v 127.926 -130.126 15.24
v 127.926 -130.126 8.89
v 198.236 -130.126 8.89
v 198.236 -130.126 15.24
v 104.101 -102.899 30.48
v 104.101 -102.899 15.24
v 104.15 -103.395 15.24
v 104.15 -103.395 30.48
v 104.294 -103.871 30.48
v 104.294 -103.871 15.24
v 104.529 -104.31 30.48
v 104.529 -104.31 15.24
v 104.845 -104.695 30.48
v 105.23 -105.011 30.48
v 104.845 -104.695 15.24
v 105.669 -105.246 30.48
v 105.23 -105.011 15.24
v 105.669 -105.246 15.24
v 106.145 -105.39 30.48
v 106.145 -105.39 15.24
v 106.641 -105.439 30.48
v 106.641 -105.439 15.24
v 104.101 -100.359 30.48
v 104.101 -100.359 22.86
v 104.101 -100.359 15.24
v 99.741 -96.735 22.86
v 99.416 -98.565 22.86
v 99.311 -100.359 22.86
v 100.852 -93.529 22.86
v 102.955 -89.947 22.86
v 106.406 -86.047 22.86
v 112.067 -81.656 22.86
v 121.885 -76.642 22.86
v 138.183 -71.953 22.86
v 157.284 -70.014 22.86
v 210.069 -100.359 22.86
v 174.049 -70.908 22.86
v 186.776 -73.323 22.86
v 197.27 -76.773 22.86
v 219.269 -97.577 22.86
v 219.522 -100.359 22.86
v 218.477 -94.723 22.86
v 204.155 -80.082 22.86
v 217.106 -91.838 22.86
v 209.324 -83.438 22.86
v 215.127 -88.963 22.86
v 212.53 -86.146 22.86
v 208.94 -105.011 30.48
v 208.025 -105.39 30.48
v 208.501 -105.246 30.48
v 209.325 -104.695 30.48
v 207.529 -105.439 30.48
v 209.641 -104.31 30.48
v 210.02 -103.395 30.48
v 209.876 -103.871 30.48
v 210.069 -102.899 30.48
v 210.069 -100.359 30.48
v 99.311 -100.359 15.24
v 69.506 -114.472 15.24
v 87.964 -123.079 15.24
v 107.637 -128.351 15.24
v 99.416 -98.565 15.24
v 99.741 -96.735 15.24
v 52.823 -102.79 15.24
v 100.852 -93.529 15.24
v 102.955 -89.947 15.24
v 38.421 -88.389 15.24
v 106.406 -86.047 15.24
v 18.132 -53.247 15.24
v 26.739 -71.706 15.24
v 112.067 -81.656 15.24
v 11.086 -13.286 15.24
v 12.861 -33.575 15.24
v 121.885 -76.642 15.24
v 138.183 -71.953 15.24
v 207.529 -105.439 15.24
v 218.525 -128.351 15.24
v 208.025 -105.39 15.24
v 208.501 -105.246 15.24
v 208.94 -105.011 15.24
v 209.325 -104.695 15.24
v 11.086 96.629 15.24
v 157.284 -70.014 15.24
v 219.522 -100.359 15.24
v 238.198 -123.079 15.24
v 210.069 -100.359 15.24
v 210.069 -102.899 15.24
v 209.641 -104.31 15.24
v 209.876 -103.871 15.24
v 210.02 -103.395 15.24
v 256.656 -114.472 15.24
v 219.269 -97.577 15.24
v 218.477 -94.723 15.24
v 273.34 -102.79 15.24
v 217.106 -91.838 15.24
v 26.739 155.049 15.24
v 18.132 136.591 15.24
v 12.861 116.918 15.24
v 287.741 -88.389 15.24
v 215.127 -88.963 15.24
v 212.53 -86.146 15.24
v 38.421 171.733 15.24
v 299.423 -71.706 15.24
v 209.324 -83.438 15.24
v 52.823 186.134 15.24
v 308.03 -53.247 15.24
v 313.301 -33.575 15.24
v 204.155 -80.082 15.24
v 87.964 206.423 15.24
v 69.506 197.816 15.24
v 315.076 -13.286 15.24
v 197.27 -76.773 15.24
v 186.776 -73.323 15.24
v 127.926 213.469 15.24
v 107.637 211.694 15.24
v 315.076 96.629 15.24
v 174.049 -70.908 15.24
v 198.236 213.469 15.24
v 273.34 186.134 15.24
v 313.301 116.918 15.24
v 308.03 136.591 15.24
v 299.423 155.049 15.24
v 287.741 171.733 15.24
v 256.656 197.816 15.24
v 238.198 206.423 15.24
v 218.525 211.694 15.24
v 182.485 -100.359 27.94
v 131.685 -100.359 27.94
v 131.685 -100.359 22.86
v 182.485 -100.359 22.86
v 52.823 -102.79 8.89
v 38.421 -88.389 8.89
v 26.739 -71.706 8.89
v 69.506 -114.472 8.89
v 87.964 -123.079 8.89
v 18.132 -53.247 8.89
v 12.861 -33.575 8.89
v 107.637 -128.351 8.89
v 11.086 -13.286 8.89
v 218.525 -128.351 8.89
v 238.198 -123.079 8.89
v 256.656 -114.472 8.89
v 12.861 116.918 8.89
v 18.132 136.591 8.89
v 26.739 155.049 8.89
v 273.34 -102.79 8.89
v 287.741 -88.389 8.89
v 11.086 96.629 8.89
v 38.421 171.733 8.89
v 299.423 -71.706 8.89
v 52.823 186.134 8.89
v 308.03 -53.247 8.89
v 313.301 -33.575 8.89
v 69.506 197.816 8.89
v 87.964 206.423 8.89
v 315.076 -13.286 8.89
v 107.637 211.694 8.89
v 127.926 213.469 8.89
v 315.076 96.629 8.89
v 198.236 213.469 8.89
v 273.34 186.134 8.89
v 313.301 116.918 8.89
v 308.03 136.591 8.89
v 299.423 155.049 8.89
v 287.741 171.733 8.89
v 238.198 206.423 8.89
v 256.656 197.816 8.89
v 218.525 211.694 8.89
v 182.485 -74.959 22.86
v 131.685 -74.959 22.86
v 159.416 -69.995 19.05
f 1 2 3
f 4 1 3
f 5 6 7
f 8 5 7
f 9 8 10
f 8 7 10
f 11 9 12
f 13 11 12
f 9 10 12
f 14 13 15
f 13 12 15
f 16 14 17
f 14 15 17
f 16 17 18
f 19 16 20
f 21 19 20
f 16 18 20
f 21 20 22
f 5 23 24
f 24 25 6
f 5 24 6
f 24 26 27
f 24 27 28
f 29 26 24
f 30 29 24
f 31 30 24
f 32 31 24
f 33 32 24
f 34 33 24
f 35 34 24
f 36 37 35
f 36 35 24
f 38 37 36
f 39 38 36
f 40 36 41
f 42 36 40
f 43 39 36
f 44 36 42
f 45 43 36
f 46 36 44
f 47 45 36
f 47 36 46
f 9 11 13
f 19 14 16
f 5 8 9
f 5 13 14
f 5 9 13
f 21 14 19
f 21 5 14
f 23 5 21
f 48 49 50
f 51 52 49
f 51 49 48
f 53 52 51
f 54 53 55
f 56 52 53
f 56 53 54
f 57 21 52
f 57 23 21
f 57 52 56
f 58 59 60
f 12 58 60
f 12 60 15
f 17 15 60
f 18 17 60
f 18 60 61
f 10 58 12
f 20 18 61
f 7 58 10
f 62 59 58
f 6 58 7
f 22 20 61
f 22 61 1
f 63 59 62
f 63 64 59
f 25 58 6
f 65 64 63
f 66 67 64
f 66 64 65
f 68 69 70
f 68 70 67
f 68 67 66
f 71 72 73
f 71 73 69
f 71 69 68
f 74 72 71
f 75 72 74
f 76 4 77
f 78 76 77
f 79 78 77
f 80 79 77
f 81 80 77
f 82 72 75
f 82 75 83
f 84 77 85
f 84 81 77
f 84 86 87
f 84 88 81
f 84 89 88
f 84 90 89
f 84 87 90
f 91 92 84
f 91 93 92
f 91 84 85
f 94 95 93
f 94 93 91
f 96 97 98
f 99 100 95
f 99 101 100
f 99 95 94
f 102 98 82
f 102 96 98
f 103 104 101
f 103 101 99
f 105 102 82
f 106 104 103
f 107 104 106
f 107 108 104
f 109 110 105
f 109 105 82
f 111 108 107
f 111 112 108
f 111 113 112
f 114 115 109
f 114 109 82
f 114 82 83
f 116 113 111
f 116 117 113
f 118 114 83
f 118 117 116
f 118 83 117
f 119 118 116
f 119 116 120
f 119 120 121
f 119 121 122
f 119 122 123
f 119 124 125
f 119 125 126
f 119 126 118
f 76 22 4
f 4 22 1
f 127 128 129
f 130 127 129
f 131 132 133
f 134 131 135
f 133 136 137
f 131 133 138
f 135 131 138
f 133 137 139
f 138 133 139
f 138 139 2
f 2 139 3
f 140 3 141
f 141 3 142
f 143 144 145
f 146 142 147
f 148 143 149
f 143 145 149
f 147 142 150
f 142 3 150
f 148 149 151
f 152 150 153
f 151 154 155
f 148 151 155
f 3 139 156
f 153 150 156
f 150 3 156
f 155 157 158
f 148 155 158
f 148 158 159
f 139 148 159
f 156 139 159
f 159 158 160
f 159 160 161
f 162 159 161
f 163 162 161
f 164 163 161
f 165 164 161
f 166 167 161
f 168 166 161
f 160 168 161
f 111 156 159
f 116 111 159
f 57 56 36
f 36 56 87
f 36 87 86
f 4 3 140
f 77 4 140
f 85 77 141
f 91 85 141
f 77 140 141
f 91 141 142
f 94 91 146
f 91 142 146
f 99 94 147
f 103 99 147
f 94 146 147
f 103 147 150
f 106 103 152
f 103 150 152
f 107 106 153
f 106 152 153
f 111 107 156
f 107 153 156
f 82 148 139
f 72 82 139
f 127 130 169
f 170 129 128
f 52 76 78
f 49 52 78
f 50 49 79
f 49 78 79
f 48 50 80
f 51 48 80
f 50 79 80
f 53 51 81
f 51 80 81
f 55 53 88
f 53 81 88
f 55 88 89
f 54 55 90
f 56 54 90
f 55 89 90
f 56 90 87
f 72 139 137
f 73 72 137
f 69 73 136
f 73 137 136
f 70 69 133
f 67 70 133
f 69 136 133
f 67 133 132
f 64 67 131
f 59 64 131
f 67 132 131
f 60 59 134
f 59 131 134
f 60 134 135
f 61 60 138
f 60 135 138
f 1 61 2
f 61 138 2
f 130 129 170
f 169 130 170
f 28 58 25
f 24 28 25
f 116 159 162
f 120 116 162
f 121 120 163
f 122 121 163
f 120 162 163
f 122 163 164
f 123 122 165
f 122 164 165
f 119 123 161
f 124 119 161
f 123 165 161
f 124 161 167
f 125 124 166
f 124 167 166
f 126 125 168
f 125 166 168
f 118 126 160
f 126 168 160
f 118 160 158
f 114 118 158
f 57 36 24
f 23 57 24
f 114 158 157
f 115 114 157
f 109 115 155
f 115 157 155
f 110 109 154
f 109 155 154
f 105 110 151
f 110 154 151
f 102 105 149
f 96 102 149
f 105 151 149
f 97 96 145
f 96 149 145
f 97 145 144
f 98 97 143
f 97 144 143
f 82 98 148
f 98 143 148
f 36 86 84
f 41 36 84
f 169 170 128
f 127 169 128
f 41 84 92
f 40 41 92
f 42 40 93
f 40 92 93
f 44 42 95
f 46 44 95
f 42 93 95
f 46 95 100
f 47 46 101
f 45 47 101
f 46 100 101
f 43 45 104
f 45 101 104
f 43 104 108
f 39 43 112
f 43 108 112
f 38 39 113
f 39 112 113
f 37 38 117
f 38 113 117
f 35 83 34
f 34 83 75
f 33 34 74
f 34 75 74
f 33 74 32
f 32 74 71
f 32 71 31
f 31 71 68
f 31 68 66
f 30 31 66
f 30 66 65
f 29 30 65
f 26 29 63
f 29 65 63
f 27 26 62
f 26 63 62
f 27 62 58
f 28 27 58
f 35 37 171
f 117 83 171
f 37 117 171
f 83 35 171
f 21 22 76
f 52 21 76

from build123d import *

# Parameters (mm, degrees)
BOSS_EXTRUDE3_DEPTH = 6.35
BOSS_EXTRUDE4_DEPTH = 7.62
BOSS_EXTRUDE5_DEPTH = 15.24
GUSSET1_THICKNESS   = 50.8


with BuildPart() as part:
    # Sketch14 → Boss-Extrude3 (new body)
    with BuildSketch(Plane.XY.offset(8.89)):
        with BuildLine():
            Line((198.236322144, 213.469330483), (127.925881088, 213.469330483))
            ThreePointArc((127.925881088, 213.469330483), (45.307524774, 179.247686797), (11.085881088, 96.629330483))
            Line((11.085881088, 96.629330483), (11.085881088, -13.285692494))
            ThreePointArc((11.085881088, -13.285692494), (45.307524774, -95.904048808), (127.925881088, -130.125692494))
            Line((127.925881088, -130.125692494), (198.236322144, -130.125692494))
            ThreePointArc((198.236322144, -130.125692494), (280.854678457, -95.904048808), (315.076322144, -13.285692494))
            Line((315.076322144, -13.285692494), (315.076322144, 96.629330483))
            ThreePointArc((315.076322144, 96.629330483), (280.854678457, 179.247686797), (198.236322144, 213.469330483))
        make_face()
    extrude(amount=BOSS_EXTRUDE3_DEPTH)

    # Sketch15 → Boss-Extrude4 (add)
    with BuildSketch(Plane.XY.offset(15.24)):
        with BuildLine():
            Line((99.311309815, -100.359196716), (219.521518968, -100.359196716))
            add(Edge.make_bspline(
                [(219.521518968, -100.359196716), (219.521518968, -69.99464543), (159.416414392, -69.99464543), (99.311309815, -69.99464543), (99.311309815, -100.359196716)],
                knots=[3.141592654, 3.141592654, 3.141592654, 4.71238898, 4.71238898, 6.283185307, 6.283185307, 6.283185307], degree=2, weights=[1, 0.707106781, 1, 0.707106781, 1]))
        make_face()
    extrude(amount=BOSS_EXTRUDE4_DEPTH)

    # Sketch15<3> → Boss-Extrude5 (add)
    with BuildSketch(Plane.XY.offset(15.24)):
        with BuildLine():
            Line((210.069251259, -100.359196716), (104.100842418, -100.359196716))
            Line((104.100842418, -100.359196716), (104.100842418, -102.899196716))
            ThreePointArc((104.100842418, -102.899196716), (104.844791194, -104.69524794), (106.640842418, -105.439196716))
            Line((106.640842418, -105.439196716), (207.529251259, -105.439196716))
            ThreePointArc((207.529251259, -105.439196716), (209.325302483, -104.69524794), (210.069251259, -102.899196716))
            Line((210.069251259, -102.899196716), (210.069251259, -100.359196716))
        make_face()
    extrude(amount=BOSS_EXTRUDE5_DEPTH)


with BuildPart() as body_2:
    # Gusset1: a gusset: a plate 50.8 thick in the corner of two members, its outline drawn in place
    gusset1_outline = Wire([Line((182.485046839, -100.359196716, 22.86), (182.485046839, -74.959196716, 22.86)), Line((182.485046839, -74.959196716, 22.86), (182.485046839, -100.359196716, 27.94)), Line((182.485046839, -100.359196716, 27.94), (182.485046839, -100.359196716, 22.86))])
    add(extrude(Face(gusset1_outline), amount=GUSSET1_THICKNESS, dir=(-1, 0, 0)))


solid = Compound([part.part, body_2.part])
